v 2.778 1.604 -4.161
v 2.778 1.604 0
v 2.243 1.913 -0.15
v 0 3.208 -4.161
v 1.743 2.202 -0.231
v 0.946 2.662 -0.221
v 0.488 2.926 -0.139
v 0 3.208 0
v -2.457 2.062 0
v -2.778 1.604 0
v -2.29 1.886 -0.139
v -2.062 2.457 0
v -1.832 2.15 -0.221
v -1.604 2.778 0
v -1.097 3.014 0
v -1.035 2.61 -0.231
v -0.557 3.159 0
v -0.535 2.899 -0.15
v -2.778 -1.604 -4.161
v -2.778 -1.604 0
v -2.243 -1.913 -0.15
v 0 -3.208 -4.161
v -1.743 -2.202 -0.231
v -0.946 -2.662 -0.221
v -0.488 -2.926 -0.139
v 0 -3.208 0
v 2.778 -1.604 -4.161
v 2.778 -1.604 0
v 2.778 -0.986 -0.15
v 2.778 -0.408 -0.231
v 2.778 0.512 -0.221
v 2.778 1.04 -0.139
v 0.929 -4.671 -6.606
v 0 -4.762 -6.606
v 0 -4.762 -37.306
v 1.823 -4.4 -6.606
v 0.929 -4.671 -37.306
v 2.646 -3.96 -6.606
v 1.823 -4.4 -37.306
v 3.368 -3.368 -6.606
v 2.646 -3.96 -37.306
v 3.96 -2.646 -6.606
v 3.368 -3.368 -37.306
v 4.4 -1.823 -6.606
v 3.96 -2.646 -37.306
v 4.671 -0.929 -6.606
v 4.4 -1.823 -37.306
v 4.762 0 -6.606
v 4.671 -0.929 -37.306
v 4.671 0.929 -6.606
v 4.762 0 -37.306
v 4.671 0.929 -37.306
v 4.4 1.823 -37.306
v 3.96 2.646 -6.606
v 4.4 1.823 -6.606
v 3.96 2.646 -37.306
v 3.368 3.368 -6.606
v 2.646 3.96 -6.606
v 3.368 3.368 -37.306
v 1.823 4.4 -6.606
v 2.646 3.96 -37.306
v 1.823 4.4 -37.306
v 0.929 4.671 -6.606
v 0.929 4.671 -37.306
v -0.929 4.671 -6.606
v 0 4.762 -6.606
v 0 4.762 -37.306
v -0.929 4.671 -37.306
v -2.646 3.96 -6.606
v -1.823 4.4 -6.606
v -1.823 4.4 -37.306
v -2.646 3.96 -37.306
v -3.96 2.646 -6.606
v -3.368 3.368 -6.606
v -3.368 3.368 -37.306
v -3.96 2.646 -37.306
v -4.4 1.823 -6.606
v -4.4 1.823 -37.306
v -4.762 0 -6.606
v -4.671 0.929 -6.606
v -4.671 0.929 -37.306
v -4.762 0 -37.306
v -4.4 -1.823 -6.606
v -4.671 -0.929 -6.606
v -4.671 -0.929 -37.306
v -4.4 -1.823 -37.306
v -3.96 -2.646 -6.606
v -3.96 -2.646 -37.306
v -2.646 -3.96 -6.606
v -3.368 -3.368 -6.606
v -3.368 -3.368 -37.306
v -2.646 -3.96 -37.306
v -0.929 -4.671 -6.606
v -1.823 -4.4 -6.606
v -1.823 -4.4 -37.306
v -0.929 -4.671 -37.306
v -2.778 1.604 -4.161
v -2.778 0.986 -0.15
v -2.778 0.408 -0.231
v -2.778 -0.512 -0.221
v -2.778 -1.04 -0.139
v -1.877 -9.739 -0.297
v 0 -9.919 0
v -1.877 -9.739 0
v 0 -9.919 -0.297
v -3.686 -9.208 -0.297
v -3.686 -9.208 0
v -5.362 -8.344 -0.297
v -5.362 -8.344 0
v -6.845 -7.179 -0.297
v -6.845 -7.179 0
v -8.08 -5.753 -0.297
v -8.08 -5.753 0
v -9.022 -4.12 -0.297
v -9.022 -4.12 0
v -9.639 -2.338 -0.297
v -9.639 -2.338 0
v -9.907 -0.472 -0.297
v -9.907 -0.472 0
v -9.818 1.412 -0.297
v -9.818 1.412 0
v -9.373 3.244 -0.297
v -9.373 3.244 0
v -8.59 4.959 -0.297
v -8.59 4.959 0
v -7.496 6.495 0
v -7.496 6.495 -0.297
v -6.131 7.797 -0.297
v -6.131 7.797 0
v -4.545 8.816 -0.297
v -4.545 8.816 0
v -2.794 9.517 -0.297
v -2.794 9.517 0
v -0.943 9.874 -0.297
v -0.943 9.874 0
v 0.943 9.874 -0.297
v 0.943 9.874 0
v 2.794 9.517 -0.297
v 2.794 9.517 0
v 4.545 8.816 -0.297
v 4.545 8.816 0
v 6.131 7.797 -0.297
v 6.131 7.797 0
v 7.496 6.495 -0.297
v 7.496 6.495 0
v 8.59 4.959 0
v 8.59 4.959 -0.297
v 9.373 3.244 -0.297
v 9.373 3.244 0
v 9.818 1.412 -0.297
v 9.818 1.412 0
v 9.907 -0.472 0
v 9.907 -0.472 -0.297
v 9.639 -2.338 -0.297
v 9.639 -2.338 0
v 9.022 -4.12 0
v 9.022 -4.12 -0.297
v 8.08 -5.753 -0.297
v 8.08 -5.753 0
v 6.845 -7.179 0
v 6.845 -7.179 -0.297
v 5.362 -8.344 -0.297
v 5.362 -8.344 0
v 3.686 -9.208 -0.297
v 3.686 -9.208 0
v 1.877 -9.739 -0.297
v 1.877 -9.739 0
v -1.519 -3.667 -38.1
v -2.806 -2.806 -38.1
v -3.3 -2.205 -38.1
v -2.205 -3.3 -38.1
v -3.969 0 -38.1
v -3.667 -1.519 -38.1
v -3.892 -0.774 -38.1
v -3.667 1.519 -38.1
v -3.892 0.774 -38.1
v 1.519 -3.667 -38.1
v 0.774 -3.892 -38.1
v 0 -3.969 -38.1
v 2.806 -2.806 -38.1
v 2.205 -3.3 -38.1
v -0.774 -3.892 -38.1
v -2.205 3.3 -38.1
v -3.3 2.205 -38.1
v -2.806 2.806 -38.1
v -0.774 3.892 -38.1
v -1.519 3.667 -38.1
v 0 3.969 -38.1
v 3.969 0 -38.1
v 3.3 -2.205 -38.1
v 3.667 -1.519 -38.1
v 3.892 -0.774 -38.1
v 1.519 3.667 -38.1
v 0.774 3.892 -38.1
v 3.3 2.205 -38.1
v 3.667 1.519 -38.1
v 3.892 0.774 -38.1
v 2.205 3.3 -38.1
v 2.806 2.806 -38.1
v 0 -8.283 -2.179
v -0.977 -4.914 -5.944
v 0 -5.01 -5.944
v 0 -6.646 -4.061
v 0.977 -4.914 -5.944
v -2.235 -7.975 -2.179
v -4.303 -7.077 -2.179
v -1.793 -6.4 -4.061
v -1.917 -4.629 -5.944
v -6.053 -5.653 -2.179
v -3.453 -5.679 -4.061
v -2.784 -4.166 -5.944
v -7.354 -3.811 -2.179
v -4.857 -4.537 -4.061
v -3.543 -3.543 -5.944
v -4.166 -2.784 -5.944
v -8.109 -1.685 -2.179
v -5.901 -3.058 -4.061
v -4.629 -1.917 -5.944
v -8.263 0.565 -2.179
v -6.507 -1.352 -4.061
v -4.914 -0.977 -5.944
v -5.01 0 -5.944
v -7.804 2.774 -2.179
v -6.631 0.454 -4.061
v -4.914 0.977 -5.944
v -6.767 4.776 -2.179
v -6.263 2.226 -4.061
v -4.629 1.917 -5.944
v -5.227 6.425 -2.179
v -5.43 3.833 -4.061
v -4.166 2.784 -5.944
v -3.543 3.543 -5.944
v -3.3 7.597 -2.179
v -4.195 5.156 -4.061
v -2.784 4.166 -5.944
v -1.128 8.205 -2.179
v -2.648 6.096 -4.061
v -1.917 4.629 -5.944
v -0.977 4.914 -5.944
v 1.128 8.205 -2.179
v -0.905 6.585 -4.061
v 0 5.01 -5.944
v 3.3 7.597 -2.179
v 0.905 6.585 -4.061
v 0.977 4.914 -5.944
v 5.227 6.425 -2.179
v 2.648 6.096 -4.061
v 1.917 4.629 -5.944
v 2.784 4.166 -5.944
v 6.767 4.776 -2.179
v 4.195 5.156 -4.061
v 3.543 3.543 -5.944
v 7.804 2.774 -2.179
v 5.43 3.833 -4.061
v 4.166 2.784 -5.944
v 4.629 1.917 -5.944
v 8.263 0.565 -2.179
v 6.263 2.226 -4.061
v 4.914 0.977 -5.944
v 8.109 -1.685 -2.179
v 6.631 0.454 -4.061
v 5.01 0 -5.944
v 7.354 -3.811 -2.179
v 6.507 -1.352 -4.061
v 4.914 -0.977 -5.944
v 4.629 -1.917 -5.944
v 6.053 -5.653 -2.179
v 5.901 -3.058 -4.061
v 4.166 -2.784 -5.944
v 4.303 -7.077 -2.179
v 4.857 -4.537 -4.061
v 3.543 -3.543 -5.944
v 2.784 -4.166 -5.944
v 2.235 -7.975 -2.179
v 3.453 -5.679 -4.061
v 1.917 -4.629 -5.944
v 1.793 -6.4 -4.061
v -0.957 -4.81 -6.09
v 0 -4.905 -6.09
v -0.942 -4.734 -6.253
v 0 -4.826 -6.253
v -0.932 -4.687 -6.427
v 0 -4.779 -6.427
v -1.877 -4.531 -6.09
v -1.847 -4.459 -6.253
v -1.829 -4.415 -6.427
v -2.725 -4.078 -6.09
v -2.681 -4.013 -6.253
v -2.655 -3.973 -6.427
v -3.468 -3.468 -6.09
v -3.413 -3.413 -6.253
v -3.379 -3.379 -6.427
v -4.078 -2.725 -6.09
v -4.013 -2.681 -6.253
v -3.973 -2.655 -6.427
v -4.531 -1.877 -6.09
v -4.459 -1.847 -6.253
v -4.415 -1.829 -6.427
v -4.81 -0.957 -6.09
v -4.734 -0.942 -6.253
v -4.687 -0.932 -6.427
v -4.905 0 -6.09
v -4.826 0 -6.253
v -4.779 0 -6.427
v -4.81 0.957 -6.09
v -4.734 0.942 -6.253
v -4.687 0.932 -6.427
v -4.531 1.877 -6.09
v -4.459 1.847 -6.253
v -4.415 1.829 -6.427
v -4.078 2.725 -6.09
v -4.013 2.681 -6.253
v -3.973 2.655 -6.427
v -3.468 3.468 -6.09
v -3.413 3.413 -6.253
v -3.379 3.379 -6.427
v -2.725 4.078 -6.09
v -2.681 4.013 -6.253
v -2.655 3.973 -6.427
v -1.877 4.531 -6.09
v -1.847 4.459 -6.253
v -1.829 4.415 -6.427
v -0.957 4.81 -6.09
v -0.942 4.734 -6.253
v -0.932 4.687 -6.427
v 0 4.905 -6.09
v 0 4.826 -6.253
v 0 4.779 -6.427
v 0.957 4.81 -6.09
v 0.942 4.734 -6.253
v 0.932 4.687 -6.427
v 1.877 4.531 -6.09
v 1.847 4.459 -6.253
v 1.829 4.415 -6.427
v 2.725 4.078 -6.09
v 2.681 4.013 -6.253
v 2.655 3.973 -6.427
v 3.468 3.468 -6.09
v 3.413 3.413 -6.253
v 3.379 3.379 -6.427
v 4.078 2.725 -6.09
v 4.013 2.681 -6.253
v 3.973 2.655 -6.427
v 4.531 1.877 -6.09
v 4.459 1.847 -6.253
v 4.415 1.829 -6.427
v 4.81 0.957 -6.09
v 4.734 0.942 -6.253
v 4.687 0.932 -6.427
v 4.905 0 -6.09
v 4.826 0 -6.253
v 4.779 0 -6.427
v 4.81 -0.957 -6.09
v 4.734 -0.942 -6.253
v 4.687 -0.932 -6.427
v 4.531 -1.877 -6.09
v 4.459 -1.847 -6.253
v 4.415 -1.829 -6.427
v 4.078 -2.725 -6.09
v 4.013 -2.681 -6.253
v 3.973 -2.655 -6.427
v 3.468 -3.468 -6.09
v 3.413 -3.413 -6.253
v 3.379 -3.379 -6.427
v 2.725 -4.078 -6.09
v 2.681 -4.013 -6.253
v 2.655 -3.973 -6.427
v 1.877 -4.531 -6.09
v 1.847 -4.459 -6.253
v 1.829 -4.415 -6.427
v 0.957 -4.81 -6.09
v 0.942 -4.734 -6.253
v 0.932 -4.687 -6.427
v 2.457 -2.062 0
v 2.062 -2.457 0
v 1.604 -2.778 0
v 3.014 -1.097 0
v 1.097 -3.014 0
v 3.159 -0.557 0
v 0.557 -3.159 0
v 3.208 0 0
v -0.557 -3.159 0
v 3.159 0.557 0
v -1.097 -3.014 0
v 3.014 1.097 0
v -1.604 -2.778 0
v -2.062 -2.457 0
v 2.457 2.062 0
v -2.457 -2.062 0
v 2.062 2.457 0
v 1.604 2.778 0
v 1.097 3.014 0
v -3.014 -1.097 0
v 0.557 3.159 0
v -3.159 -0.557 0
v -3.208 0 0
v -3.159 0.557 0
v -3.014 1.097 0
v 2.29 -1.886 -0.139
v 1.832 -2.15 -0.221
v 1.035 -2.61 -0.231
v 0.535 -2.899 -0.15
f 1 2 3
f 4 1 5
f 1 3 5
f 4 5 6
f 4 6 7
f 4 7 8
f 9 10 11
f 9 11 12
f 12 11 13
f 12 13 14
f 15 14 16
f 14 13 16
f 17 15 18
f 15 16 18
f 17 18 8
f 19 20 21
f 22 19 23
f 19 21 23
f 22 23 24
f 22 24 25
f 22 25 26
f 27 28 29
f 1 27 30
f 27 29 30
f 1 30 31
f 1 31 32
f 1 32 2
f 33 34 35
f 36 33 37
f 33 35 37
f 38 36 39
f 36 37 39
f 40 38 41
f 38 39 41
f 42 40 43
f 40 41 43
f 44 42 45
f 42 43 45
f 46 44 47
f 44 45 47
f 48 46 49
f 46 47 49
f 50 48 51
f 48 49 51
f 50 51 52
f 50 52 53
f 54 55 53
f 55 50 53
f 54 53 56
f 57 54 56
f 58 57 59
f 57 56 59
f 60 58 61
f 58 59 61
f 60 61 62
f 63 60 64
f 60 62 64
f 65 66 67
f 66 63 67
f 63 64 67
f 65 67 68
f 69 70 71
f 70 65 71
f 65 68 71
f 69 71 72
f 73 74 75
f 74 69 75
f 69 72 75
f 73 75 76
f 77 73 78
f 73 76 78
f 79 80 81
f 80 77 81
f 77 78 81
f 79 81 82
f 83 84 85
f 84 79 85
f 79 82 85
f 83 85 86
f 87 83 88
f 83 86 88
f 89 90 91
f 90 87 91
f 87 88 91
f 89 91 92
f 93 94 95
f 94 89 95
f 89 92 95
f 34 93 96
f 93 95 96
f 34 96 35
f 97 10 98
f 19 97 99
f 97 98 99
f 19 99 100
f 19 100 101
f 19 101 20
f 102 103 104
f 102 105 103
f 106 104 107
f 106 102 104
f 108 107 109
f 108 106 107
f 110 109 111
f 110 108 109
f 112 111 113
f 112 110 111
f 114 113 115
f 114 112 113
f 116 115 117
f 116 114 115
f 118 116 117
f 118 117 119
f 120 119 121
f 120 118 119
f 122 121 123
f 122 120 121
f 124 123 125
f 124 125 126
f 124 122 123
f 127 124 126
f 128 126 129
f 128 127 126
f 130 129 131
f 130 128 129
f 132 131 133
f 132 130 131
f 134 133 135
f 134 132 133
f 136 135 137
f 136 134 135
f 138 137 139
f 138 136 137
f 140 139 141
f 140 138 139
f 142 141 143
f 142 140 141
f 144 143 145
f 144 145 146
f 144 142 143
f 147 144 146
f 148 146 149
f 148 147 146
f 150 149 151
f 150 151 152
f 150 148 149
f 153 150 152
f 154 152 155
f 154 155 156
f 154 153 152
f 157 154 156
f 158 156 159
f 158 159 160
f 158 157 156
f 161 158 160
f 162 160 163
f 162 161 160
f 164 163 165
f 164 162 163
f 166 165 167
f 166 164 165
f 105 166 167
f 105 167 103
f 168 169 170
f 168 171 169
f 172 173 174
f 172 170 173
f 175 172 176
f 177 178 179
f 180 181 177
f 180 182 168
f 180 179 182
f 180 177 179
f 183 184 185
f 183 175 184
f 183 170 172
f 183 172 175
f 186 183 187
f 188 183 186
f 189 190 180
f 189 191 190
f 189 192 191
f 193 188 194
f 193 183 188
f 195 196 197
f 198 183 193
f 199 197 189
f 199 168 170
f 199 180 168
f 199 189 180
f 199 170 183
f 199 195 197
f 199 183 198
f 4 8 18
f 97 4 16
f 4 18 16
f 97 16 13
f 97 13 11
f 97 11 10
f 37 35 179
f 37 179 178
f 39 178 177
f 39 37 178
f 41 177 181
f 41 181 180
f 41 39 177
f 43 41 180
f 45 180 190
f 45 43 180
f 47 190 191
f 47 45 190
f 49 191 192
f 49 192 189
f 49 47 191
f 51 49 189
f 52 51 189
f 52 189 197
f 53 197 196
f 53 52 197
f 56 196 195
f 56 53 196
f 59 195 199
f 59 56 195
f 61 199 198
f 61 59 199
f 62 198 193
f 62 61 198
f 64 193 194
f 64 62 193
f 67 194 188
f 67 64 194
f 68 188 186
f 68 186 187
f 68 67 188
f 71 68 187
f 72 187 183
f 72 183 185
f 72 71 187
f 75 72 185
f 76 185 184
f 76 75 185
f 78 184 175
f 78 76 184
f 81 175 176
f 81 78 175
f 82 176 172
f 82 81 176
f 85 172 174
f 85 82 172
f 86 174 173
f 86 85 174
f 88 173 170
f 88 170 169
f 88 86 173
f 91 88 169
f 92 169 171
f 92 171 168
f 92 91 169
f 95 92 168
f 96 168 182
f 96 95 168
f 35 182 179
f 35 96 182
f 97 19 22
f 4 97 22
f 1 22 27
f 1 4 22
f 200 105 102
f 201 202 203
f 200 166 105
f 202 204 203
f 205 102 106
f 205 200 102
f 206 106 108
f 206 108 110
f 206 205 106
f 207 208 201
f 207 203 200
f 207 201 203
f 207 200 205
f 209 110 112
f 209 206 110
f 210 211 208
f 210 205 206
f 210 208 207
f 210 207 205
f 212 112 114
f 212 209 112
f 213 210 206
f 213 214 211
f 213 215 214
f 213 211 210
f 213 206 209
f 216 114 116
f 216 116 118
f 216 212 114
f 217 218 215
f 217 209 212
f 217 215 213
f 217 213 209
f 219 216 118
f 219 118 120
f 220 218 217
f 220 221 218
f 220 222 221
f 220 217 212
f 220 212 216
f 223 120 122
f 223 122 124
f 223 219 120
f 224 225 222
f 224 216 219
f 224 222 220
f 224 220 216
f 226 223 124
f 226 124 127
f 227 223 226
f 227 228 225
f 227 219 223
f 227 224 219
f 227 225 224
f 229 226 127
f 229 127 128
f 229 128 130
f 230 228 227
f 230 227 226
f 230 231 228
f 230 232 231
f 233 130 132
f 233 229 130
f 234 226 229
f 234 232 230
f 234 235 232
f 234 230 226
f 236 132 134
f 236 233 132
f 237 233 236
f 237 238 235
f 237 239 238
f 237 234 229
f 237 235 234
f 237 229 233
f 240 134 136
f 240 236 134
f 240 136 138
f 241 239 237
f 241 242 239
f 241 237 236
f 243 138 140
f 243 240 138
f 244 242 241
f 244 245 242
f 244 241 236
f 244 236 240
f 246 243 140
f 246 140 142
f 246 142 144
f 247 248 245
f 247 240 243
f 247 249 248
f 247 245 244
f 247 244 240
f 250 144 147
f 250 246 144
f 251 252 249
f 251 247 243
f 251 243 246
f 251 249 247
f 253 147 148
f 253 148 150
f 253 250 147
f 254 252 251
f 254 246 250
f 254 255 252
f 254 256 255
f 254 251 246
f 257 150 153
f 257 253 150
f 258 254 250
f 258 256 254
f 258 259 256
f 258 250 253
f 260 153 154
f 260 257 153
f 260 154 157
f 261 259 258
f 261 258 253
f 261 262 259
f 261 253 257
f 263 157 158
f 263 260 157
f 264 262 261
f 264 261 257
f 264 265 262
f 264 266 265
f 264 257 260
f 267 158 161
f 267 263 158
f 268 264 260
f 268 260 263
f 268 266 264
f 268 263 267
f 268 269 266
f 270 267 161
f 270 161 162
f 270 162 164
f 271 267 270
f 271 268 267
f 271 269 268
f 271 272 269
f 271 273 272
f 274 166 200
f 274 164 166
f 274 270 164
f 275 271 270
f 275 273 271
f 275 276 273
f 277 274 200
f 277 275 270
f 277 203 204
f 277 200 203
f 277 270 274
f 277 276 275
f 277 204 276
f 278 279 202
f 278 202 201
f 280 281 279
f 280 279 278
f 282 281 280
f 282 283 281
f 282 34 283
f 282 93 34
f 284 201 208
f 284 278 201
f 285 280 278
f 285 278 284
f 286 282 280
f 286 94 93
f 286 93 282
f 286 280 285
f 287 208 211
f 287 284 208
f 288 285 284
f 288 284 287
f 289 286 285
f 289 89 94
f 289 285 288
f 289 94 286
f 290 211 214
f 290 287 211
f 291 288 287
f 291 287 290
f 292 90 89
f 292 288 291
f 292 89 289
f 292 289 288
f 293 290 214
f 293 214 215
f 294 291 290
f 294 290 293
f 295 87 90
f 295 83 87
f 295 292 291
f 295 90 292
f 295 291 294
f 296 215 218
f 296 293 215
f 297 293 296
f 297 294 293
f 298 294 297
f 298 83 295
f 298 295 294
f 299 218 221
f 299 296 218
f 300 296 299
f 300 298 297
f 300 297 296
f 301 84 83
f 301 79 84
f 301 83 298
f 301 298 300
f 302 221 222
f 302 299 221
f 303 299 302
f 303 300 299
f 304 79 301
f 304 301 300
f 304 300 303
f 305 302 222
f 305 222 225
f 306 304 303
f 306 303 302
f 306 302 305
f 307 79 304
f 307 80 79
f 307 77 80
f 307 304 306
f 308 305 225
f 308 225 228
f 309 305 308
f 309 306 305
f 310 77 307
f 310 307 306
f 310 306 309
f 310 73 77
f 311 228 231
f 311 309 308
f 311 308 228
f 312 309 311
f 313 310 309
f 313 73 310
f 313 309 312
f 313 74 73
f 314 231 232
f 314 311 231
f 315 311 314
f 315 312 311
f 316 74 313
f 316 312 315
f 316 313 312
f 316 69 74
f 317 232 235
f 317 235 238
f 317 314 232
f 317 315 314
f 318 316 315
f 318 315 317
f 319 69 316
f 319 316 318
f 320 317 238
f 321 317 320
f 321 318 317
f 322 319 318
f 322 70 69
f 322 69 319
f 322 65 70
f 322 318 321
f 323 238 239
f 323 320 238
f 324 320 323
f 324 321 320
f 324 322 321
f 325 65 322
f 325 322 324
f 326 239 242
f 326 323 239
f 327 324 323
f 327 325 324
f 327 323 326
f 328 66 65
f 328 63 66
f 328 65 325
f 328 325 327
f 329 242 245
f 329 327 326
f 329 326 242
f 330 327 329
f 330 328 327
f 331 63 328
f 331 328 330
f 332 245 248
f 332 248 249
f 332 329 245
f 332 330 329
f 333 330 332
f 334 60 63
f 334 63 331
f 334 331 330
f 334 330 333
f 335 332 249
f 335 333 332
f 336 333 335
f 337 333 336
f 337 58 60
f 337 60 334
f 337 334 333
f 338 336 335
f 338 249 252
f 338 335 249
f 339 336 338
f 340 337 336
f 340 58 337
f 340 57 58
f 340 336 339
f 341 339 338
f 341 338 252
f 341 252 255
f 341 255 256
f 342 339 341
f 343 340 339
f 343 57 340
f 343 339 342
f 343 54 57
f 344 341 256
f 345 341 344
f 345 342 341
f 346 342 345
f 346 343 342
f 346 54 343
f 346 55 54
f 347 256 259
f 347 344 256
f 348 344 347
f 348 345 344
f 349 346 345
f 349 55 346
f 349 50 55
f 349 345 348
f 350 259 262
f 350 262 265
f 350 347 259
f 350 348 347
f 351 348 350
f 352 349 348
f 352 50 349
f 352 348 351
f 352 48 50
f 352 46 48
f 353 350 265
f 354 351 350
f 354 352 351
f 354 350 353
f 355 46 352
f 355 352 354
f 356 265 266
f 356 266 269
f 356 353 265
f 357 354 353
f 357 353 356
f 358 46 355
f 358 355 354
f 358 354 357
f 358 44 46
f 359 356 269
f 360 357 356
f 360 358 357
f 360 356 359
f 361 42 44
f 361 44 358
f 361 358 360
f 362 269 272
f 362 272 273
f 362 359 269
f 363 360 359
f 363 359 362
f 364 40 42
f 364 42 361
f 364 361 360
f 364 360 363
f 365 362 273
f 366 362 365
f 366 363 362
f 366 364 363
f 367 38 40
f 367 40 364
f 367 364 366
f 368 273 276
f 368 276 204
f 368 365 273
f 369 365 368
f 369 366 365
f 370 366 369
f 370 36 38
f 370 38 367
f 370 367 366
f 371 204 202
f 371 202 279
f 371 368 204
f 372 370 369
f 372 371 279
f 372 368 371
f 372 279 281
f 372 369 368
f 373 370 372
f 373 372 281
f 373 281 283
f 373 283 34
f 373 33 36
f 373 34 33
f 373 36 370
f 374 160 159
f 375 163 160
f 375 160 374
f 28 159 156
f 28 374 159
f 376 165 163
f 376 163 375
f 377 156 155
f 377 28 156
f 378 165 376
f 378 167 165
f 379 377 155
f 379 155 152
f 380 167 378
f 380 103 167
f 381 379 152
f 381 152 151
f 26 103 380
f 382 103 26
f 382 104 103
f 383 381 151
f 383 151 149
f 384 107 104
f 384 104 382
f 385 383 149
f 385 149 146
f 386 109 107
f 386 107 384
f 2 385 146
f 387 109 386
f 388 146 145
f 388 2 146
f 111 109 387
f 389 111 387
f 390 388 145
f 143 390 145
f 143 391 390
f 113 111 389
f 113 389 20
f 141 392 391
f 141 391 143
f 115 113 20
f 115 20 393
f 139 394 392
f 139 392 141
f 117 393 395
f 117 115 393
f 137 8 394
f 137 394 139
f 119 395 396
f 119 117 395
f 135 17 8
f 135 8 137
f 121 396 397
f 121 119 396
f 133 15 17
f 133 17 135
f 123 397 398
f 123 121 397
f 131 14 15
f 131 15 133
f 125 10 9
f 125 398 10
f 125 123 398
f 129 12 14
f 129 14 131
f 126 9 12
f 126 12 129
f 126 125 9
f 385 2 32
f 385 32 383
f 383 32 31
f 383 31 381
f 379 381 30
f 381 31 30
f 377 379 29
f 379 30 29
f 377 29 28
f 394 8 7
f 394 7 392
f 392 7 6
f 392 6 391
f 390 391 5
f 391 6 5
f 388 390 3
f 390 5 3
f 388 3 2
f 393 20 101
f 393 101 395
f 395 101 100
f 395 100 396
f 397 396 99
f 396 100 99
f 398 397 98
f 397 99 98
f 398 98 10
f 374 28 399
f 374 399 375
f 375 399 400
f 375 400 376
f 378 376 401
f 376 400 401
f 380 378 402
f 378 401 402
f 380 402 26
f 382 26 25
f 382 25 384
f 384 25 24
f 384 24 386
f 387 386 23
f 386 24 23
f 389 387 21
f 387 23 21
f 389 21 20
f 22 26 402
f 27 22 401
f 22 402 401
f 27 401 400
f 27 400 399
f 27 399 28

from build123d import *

# Parameters (mm, degrees)
SKETCH1_W          = 38.1
SKETCH1_H          = 4.7625
CHAMFER1_SIZE      = 0.79375
CUT_EXTRUDE2_DEPTH = 4.16052


with BuildPart() as part:
    # Sketch1 → Revolve1 (revolve)
    with BuildSketch(Plane(origin=(0, 0, 0), x_dir=(0, 0, -1), z_dir=(1, 0, 0)), mode=Mode.PRIVATE) as revolve1_sk:
        with Locations((19.05, 2.38125)):
            Rectangle(SKETCH1_W, SKETCH1_H)
    revolve(revolve1_sk.sketch.rotate(Axis((0, 0, -38.1), (0, 0, 1)), 180), axis=Axis((0, 0, -38.1), (0, 0, 1)))

    # Chamfer1
    chamfer1_edges = [part.edges().sort_by_distance(p)[0] for p in [
        (0, 4.7625, -38.1),
    ]]
    chamfer(chamfer1_edges, length=CHAMFER1_SIZE)

    # Sketch7 → Revolve2 (revolve)
    with BuildSketch(Plane(origin=(0, 0, 0), x_dir=(0, 0, -1), z_dir=(1, 0, 0)), mode=Mode.PRIVATE) as revolve2_sk:
        with BuildLine():
            Line((0, 9.9187), (0.29718, 9.9187))
            Line((0.29718, 9.9187), (5.9436, 5.010341978))
            ThreePointArc((5.9436, 5.010341978), (6.252633175, 4.826486559), (6.606483481, 4.7625))
            Line((6.606483481, 4.7625), (6.606483481, 0))
            Line((6.606483481, 0), (0, 0))
            Line((0, 0), (0, 9.9187))
        make_face()
    revolve(revolve2_sk.sketch.rotate(Axis((0, 0, 0), (0, 0, -1)), 180), axis=Axis((0, 0, 0), (0, 0, -1)))

    # Boss-Extrude1 cone 1 section (through the dimple's axis) → Boss-Extrude1 (revolve)
    with BuildSketch(Plane(origin=(0, 0, -6.606483481), x_dir=(0, -1, 0), z_dir=(1, 0, 0))):
        Polygon((0, 0), (4.7625, 0), (0, 4.59909279), align=None)
    revolve(axis=Axis((0, 0, -6.606483481), (0, 0, -1)))

    # Sketch5 → Cut-Extrude2 (cut)
    with BuildSketch(Plane.XY):
        Polygon((0, 3.207902433), (-2.778125, 1.603951217), (-2.778125, -1.603951217), (0, -3.207902433), (2.778125, -1.603951217), (2.778125, 1.603951217), align=None)
    extrude(amount=-CUT_EXTRUDE2_DEPTH, mode=Mode.SUBTRACT)

    # Cut-Extrude3 cone 1 section (through the dimple's axis) → Cut-Extrude3 (revolve, cut)
    with BuildSketch(Plane(origin=(0, 0, 0), x_dir=(0, -1, 0), z_dir=(1, 0, 0))):
        Polygon((0, 0), (3.207902433, 0), (0, 1.852083333), align=None)
    revolve(axis=Axis((0, 0, 0), (0, 0, -1)), mode=Mode.SUBTRACT)


solid = part.part
